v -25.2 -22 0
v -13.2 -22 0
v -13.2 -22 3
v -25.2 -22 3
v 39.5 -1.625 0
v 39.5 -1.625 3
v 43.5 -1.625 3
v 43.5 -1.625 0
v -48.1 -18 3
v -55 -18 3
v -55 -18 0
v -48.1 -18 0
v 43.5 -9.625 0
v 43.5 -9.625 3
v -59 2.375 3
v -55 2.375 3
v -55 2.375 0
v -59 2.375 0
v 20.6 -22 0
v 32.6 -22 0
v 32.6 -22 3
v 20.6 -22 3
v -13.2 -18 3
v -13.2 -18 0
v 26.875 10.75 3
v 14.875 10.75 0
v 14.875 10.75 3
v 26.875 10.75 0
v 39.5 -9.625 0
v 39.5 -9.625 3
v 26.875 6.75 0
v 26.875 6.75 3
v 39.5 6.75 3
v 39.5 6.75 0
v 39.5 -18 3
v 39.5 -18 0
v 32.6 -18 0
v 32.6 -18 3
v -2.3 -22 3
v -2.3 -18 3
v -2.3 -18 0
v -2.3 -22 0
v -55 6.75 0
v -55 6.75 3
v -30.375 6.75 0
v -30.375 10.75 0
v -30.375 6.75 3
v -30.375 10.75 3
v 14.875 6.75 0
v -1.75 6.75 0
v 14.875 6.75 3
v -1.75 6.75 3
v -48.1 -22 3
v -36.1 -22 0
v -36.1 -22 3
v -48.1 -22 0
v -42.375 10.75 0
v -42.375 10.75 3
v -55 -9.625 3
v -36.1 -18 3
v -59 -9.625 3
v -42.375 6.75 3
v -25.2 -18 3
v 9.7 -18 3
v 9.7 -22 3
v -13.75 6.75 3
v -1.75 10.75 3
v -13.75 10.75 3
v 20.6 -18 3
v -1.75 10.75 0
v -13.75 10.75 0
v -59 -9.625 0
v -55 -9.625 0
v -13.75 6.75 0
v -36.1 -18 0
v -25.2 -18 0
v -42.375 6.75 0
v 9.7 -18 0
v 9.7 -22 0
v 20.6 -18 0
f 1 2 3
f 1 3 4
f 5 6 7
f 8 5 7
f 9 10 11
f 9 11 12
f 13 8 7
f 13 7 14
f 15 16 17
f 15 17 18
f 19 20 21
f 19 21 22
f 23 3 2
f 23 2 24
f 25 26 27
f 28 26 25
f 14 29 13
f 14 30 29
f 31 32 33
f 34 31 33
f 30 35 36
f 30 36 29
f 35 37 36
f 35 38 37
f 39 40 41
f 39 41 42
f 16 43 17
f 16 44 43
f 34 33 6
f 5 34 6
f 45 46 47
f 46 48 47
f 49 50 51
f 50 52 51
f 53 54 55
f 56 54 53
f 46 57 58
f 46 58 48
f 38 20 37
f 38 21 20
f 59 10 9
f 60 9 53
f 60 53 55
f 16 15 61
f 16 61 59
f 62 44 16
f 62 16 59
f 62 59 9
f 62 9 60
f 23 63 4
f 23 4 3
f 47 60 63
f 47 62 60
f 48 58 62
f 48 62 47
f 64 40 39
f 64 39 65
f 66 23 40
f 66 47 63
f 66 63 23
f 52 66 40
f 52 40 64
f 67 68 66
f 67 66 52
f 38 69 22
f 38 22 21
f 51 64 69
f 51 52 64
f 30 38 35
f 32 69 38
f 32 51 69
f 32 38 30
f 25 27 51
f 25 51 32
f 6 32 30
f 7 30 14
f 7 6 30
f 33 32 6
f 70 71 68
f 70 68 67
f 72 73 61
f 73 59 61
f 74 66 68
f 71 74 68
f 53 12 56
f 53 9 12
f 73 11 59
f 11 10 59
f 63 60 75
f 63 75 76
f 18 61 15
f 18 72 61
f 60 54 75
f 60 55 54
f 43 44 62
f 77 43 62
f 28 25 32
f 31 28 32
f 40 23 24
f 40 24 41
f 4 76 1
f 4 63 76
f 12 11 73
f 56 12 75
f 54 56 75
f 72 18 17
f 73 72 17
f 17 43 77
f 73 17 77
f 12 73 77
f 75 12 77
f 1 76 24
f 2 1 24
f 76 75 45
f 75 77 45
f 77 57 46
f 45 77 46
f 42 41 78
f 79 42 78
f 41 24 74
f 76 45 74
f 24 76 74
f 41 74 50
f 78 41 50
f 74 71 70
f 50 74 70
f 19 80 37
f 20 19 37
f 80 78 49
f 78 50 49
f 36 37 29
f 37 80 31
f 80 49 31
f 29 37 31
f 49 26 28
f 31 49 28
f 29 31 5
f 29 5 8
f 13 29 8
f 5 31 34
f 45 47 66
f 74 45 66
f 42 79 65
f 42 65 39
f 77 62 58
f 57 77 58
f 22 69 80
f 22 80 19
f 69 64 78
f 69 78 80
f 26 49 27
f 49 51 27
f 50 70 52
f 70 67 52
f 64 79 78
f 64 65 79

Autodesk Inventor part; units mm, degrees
ref_plane "YZ Plane" through (0, 0, 0) normal (1, 0, 0) x (0, 1, 0)
ref_plane "XZ Plane" through (0, 0, 0) normal (0, 1, 0) x (-1, 0, 0)
ref_plane "XY Plane" through (0, 0, 0) normal (0, 0, 1) x (1, 0, 0)
sketch "Esboço1" plane through (0, 0, 0) normal (0, 0, 1) x (1, 0, 0)
  line L0 (-59, 10.75) -> (43.5, 10.75)
  line L1 (43.5, 10.75) -> (43.5, -22)
  line L2 (43.5, -22) -> (-59, -22)
  line L3 (-59, -22) -> (-59, 10.75)
  point P0 (0, 0)
  dimension "d34" = 43.5
  dimension "d35" = 22
  dimension "d49" = 10.75
  dimension "d59" = 59
extrude "Extrusão1" add sketch "Esboço1" along normal blind 3
sketch "Esboço2" plane through (0, 0, 3) normal (0, 0, 1) x (1, 0, 0)
  line L0 (-59, -22) -> (43.5, -22) projected
  line L1 (43.5, -22) -> (42.5, -22)
  line L2 (43.5, 10.75) -> (26.875, 10.75)
  line L3 (26.875, 10.75) -> (26.875, 6.75)
  line L4 (26.875, 6.75) -> (43.5, 6.75)
  line L5 (43.5, 6.75) -> (43.5, 10.75)
  line L6 (14.875, 10.75) -> (-1.75, 10.75)
  line L7 (-1.75, 10.75) -> (-1.75, 6.75)
  line L8 (-1.75, 6.75) -> (14.875, 6.75)
  line L9 (14.875, 6.75) -> (14.875, 10.75)
  line L10 (-13.75, 10.75) -> (-30.375, 10.75)
  line L11 (-30.375, 10.75) -> (-30.375, 6.75)
  line L12 (-30.375, 6.75) -> (-13.75, 6.75)
  line L13 (-13.75, 6.75) -> (-13.75, 10.75)
  line L14 (-42.375, 10.75) -> (-59, 10.75)
  line L15 (-59, 10.75) -> (-59, 6.75)
  line L16 (-59, 6.75) -> (-42.375, 6.75)
  line L17 (-42.375, 6.75) -> (-42.375, 10.75)
  line L18 (43.5, -22) -> (32.6, -22)
  line L19 (32.6, -22) -> (32.6, -18)
  line L20 (32.6, -18) -> (43.5, -18)
  line L21 (43.5, -18) -> (43.5, -22)
  line L22 (9.7, -22) -> (9.7, -18)
  line L23 (20.6, -22) -> (19.6, -22)
  line L24 (20.6, -22) -> (9.7, -22)
  line L25 (20.6, -18) -> (20.6, -22)
  line L26 (9.7, -18) -> (20.6, -18)
  line L27 (-13.2, -22) -> (-13.2, -18)
  line L28 (-2.3, -22) -> (-3.3, -22)
  line L29 (-2.3, -22) -> (-13.2, -22)
  line L30 (-2.3, -18) -> (-2.3, -22)
  line L31 (-13.2, -18) -> (-2.3, -18)
  line L32 (-36.1, -22) -> (-36.1, -18)
  line L33 (-25.2, -22) -> (-26.2, -22)
  line L34 (-25.2, -22) -> (-36.1, -22)
  line L35 (-25.2, -18) -> (-25.2, -22)
  line L36 (-36.1, -18) -> (-25.2, -18)
  line L37 (-59, -22) -> (-59, -18)
  line L38 (-48.1, -22) -> (-49.1, -22)
  line L39 (-48.1, -22) -> (-59, -22)
  line L40 (-48.1, -18) -> (-48.1, -22)
  line L41 (-59, -18) -> (-48.1, -18)
  line L42 (-59, 10.75) -> (-59, -22) projected
  line L43 (-59, -22) -> (-59, -22)
  line L44 (-59, -22) -> (-59, -18)
  line L45 (-59, -18) -> (-59, -18)
  line L46 (-59, -18) -> (-59, -22)
  line L47 (-59, 6.75) -> (-59, 6.75)
  line L48 (-59, 6.75) -> (-59, 10.75)
  line L49 (-59, 10.75) -> (-59, 10.75)
  line L50 (-59, 10.75) -> (-59, 6.75)
  line L51 (-59, -18) -> (-59, -9.625) construction
  line L52 (-59, -9.625) -> (-55, -9.625) construction
  line L53 (-55, 2.375) -> (-59, 2.375) construction
  line L54 (-59, 2.375) -> (-59, -9.625) construction
  line L55 (-13.75, 10.75) -> (-13.75, -22) construction
  line L56 (43.5, -22) -> (43.5, 10.75) projected
  line L57 (43.5, -9.625) -> (39.5, -9.625) construction
  line L58 (39.5, -1.625) -> (43.5, -1.625) construction
  line L59 (43.5, -1.625) -> (43.5, -9.625)
  line L60 (39.5, -9.625) -> (43.5, -9.625)
  line L61 (43.5, -9.625) -> (43.5, -18)
  line L62 (43.5, -18) -> (39.5, -18)
  line L63 (39.5, -18) -> (39.5, -9.625)
  line L64 (39.5, -1.625) -> (43.5, -1.625)
  line L65 (43.5, -1.625) -> (43.5, 6.75)
  line L66 (43.5, 6.75) -> (39.5, 6.75)
  line L67 (39.5, 6.75) -> (39.5, -1.625)
  line L68 (-55, -9.625) -> (-59, -9.625)
  line L69 (-59, -9.625) -> (-59, -18)
  line L70 (-59, -18) -> (-55, -18)
  line L71 (-55, -18) -> (-55, -9.625)
  line L72 (-55, 2.375) -> (-59, 2.375)
  line L73 (-59, 2.375) -> (-59, 6.75)
  line L74 (-59, 6.75) -> (-55, 6.75)
  line L75 (-55, 6.75) -> (-55, 2.375)
  point P0 (-48.1, -22)
  point P1 (-36.1, -22)
  point P2 (-25.2, -22)
  point P3 (-13.2, -22)
  point P4 (-2.3, -22)
  point P5 (9.7, -22)
  point P6 (32.6, -22)
  point P7 (-57.4, -18)
  point P8 (-57, 14.75)
  point P9 (-59, 10.75)
  point P10 (-55, 6.75)
  point P11 (-59, 6.75)
  point P12 (39.5, 6.75)
  point P13 (43.5, -1.625)
  dimension "d40" = 4
  dimension "d41" = 16.625
  dimension "d44" = 28.625
  dimension "d50" = 10.9
  dimension "d51" = 4
  dimension "d54" = 22.9
  dimension "d60" = 8.375
extrude "Extrusão2" cut sketch "Esboço2" against normal through all
properties part number "Acrilico-Parachoque"
